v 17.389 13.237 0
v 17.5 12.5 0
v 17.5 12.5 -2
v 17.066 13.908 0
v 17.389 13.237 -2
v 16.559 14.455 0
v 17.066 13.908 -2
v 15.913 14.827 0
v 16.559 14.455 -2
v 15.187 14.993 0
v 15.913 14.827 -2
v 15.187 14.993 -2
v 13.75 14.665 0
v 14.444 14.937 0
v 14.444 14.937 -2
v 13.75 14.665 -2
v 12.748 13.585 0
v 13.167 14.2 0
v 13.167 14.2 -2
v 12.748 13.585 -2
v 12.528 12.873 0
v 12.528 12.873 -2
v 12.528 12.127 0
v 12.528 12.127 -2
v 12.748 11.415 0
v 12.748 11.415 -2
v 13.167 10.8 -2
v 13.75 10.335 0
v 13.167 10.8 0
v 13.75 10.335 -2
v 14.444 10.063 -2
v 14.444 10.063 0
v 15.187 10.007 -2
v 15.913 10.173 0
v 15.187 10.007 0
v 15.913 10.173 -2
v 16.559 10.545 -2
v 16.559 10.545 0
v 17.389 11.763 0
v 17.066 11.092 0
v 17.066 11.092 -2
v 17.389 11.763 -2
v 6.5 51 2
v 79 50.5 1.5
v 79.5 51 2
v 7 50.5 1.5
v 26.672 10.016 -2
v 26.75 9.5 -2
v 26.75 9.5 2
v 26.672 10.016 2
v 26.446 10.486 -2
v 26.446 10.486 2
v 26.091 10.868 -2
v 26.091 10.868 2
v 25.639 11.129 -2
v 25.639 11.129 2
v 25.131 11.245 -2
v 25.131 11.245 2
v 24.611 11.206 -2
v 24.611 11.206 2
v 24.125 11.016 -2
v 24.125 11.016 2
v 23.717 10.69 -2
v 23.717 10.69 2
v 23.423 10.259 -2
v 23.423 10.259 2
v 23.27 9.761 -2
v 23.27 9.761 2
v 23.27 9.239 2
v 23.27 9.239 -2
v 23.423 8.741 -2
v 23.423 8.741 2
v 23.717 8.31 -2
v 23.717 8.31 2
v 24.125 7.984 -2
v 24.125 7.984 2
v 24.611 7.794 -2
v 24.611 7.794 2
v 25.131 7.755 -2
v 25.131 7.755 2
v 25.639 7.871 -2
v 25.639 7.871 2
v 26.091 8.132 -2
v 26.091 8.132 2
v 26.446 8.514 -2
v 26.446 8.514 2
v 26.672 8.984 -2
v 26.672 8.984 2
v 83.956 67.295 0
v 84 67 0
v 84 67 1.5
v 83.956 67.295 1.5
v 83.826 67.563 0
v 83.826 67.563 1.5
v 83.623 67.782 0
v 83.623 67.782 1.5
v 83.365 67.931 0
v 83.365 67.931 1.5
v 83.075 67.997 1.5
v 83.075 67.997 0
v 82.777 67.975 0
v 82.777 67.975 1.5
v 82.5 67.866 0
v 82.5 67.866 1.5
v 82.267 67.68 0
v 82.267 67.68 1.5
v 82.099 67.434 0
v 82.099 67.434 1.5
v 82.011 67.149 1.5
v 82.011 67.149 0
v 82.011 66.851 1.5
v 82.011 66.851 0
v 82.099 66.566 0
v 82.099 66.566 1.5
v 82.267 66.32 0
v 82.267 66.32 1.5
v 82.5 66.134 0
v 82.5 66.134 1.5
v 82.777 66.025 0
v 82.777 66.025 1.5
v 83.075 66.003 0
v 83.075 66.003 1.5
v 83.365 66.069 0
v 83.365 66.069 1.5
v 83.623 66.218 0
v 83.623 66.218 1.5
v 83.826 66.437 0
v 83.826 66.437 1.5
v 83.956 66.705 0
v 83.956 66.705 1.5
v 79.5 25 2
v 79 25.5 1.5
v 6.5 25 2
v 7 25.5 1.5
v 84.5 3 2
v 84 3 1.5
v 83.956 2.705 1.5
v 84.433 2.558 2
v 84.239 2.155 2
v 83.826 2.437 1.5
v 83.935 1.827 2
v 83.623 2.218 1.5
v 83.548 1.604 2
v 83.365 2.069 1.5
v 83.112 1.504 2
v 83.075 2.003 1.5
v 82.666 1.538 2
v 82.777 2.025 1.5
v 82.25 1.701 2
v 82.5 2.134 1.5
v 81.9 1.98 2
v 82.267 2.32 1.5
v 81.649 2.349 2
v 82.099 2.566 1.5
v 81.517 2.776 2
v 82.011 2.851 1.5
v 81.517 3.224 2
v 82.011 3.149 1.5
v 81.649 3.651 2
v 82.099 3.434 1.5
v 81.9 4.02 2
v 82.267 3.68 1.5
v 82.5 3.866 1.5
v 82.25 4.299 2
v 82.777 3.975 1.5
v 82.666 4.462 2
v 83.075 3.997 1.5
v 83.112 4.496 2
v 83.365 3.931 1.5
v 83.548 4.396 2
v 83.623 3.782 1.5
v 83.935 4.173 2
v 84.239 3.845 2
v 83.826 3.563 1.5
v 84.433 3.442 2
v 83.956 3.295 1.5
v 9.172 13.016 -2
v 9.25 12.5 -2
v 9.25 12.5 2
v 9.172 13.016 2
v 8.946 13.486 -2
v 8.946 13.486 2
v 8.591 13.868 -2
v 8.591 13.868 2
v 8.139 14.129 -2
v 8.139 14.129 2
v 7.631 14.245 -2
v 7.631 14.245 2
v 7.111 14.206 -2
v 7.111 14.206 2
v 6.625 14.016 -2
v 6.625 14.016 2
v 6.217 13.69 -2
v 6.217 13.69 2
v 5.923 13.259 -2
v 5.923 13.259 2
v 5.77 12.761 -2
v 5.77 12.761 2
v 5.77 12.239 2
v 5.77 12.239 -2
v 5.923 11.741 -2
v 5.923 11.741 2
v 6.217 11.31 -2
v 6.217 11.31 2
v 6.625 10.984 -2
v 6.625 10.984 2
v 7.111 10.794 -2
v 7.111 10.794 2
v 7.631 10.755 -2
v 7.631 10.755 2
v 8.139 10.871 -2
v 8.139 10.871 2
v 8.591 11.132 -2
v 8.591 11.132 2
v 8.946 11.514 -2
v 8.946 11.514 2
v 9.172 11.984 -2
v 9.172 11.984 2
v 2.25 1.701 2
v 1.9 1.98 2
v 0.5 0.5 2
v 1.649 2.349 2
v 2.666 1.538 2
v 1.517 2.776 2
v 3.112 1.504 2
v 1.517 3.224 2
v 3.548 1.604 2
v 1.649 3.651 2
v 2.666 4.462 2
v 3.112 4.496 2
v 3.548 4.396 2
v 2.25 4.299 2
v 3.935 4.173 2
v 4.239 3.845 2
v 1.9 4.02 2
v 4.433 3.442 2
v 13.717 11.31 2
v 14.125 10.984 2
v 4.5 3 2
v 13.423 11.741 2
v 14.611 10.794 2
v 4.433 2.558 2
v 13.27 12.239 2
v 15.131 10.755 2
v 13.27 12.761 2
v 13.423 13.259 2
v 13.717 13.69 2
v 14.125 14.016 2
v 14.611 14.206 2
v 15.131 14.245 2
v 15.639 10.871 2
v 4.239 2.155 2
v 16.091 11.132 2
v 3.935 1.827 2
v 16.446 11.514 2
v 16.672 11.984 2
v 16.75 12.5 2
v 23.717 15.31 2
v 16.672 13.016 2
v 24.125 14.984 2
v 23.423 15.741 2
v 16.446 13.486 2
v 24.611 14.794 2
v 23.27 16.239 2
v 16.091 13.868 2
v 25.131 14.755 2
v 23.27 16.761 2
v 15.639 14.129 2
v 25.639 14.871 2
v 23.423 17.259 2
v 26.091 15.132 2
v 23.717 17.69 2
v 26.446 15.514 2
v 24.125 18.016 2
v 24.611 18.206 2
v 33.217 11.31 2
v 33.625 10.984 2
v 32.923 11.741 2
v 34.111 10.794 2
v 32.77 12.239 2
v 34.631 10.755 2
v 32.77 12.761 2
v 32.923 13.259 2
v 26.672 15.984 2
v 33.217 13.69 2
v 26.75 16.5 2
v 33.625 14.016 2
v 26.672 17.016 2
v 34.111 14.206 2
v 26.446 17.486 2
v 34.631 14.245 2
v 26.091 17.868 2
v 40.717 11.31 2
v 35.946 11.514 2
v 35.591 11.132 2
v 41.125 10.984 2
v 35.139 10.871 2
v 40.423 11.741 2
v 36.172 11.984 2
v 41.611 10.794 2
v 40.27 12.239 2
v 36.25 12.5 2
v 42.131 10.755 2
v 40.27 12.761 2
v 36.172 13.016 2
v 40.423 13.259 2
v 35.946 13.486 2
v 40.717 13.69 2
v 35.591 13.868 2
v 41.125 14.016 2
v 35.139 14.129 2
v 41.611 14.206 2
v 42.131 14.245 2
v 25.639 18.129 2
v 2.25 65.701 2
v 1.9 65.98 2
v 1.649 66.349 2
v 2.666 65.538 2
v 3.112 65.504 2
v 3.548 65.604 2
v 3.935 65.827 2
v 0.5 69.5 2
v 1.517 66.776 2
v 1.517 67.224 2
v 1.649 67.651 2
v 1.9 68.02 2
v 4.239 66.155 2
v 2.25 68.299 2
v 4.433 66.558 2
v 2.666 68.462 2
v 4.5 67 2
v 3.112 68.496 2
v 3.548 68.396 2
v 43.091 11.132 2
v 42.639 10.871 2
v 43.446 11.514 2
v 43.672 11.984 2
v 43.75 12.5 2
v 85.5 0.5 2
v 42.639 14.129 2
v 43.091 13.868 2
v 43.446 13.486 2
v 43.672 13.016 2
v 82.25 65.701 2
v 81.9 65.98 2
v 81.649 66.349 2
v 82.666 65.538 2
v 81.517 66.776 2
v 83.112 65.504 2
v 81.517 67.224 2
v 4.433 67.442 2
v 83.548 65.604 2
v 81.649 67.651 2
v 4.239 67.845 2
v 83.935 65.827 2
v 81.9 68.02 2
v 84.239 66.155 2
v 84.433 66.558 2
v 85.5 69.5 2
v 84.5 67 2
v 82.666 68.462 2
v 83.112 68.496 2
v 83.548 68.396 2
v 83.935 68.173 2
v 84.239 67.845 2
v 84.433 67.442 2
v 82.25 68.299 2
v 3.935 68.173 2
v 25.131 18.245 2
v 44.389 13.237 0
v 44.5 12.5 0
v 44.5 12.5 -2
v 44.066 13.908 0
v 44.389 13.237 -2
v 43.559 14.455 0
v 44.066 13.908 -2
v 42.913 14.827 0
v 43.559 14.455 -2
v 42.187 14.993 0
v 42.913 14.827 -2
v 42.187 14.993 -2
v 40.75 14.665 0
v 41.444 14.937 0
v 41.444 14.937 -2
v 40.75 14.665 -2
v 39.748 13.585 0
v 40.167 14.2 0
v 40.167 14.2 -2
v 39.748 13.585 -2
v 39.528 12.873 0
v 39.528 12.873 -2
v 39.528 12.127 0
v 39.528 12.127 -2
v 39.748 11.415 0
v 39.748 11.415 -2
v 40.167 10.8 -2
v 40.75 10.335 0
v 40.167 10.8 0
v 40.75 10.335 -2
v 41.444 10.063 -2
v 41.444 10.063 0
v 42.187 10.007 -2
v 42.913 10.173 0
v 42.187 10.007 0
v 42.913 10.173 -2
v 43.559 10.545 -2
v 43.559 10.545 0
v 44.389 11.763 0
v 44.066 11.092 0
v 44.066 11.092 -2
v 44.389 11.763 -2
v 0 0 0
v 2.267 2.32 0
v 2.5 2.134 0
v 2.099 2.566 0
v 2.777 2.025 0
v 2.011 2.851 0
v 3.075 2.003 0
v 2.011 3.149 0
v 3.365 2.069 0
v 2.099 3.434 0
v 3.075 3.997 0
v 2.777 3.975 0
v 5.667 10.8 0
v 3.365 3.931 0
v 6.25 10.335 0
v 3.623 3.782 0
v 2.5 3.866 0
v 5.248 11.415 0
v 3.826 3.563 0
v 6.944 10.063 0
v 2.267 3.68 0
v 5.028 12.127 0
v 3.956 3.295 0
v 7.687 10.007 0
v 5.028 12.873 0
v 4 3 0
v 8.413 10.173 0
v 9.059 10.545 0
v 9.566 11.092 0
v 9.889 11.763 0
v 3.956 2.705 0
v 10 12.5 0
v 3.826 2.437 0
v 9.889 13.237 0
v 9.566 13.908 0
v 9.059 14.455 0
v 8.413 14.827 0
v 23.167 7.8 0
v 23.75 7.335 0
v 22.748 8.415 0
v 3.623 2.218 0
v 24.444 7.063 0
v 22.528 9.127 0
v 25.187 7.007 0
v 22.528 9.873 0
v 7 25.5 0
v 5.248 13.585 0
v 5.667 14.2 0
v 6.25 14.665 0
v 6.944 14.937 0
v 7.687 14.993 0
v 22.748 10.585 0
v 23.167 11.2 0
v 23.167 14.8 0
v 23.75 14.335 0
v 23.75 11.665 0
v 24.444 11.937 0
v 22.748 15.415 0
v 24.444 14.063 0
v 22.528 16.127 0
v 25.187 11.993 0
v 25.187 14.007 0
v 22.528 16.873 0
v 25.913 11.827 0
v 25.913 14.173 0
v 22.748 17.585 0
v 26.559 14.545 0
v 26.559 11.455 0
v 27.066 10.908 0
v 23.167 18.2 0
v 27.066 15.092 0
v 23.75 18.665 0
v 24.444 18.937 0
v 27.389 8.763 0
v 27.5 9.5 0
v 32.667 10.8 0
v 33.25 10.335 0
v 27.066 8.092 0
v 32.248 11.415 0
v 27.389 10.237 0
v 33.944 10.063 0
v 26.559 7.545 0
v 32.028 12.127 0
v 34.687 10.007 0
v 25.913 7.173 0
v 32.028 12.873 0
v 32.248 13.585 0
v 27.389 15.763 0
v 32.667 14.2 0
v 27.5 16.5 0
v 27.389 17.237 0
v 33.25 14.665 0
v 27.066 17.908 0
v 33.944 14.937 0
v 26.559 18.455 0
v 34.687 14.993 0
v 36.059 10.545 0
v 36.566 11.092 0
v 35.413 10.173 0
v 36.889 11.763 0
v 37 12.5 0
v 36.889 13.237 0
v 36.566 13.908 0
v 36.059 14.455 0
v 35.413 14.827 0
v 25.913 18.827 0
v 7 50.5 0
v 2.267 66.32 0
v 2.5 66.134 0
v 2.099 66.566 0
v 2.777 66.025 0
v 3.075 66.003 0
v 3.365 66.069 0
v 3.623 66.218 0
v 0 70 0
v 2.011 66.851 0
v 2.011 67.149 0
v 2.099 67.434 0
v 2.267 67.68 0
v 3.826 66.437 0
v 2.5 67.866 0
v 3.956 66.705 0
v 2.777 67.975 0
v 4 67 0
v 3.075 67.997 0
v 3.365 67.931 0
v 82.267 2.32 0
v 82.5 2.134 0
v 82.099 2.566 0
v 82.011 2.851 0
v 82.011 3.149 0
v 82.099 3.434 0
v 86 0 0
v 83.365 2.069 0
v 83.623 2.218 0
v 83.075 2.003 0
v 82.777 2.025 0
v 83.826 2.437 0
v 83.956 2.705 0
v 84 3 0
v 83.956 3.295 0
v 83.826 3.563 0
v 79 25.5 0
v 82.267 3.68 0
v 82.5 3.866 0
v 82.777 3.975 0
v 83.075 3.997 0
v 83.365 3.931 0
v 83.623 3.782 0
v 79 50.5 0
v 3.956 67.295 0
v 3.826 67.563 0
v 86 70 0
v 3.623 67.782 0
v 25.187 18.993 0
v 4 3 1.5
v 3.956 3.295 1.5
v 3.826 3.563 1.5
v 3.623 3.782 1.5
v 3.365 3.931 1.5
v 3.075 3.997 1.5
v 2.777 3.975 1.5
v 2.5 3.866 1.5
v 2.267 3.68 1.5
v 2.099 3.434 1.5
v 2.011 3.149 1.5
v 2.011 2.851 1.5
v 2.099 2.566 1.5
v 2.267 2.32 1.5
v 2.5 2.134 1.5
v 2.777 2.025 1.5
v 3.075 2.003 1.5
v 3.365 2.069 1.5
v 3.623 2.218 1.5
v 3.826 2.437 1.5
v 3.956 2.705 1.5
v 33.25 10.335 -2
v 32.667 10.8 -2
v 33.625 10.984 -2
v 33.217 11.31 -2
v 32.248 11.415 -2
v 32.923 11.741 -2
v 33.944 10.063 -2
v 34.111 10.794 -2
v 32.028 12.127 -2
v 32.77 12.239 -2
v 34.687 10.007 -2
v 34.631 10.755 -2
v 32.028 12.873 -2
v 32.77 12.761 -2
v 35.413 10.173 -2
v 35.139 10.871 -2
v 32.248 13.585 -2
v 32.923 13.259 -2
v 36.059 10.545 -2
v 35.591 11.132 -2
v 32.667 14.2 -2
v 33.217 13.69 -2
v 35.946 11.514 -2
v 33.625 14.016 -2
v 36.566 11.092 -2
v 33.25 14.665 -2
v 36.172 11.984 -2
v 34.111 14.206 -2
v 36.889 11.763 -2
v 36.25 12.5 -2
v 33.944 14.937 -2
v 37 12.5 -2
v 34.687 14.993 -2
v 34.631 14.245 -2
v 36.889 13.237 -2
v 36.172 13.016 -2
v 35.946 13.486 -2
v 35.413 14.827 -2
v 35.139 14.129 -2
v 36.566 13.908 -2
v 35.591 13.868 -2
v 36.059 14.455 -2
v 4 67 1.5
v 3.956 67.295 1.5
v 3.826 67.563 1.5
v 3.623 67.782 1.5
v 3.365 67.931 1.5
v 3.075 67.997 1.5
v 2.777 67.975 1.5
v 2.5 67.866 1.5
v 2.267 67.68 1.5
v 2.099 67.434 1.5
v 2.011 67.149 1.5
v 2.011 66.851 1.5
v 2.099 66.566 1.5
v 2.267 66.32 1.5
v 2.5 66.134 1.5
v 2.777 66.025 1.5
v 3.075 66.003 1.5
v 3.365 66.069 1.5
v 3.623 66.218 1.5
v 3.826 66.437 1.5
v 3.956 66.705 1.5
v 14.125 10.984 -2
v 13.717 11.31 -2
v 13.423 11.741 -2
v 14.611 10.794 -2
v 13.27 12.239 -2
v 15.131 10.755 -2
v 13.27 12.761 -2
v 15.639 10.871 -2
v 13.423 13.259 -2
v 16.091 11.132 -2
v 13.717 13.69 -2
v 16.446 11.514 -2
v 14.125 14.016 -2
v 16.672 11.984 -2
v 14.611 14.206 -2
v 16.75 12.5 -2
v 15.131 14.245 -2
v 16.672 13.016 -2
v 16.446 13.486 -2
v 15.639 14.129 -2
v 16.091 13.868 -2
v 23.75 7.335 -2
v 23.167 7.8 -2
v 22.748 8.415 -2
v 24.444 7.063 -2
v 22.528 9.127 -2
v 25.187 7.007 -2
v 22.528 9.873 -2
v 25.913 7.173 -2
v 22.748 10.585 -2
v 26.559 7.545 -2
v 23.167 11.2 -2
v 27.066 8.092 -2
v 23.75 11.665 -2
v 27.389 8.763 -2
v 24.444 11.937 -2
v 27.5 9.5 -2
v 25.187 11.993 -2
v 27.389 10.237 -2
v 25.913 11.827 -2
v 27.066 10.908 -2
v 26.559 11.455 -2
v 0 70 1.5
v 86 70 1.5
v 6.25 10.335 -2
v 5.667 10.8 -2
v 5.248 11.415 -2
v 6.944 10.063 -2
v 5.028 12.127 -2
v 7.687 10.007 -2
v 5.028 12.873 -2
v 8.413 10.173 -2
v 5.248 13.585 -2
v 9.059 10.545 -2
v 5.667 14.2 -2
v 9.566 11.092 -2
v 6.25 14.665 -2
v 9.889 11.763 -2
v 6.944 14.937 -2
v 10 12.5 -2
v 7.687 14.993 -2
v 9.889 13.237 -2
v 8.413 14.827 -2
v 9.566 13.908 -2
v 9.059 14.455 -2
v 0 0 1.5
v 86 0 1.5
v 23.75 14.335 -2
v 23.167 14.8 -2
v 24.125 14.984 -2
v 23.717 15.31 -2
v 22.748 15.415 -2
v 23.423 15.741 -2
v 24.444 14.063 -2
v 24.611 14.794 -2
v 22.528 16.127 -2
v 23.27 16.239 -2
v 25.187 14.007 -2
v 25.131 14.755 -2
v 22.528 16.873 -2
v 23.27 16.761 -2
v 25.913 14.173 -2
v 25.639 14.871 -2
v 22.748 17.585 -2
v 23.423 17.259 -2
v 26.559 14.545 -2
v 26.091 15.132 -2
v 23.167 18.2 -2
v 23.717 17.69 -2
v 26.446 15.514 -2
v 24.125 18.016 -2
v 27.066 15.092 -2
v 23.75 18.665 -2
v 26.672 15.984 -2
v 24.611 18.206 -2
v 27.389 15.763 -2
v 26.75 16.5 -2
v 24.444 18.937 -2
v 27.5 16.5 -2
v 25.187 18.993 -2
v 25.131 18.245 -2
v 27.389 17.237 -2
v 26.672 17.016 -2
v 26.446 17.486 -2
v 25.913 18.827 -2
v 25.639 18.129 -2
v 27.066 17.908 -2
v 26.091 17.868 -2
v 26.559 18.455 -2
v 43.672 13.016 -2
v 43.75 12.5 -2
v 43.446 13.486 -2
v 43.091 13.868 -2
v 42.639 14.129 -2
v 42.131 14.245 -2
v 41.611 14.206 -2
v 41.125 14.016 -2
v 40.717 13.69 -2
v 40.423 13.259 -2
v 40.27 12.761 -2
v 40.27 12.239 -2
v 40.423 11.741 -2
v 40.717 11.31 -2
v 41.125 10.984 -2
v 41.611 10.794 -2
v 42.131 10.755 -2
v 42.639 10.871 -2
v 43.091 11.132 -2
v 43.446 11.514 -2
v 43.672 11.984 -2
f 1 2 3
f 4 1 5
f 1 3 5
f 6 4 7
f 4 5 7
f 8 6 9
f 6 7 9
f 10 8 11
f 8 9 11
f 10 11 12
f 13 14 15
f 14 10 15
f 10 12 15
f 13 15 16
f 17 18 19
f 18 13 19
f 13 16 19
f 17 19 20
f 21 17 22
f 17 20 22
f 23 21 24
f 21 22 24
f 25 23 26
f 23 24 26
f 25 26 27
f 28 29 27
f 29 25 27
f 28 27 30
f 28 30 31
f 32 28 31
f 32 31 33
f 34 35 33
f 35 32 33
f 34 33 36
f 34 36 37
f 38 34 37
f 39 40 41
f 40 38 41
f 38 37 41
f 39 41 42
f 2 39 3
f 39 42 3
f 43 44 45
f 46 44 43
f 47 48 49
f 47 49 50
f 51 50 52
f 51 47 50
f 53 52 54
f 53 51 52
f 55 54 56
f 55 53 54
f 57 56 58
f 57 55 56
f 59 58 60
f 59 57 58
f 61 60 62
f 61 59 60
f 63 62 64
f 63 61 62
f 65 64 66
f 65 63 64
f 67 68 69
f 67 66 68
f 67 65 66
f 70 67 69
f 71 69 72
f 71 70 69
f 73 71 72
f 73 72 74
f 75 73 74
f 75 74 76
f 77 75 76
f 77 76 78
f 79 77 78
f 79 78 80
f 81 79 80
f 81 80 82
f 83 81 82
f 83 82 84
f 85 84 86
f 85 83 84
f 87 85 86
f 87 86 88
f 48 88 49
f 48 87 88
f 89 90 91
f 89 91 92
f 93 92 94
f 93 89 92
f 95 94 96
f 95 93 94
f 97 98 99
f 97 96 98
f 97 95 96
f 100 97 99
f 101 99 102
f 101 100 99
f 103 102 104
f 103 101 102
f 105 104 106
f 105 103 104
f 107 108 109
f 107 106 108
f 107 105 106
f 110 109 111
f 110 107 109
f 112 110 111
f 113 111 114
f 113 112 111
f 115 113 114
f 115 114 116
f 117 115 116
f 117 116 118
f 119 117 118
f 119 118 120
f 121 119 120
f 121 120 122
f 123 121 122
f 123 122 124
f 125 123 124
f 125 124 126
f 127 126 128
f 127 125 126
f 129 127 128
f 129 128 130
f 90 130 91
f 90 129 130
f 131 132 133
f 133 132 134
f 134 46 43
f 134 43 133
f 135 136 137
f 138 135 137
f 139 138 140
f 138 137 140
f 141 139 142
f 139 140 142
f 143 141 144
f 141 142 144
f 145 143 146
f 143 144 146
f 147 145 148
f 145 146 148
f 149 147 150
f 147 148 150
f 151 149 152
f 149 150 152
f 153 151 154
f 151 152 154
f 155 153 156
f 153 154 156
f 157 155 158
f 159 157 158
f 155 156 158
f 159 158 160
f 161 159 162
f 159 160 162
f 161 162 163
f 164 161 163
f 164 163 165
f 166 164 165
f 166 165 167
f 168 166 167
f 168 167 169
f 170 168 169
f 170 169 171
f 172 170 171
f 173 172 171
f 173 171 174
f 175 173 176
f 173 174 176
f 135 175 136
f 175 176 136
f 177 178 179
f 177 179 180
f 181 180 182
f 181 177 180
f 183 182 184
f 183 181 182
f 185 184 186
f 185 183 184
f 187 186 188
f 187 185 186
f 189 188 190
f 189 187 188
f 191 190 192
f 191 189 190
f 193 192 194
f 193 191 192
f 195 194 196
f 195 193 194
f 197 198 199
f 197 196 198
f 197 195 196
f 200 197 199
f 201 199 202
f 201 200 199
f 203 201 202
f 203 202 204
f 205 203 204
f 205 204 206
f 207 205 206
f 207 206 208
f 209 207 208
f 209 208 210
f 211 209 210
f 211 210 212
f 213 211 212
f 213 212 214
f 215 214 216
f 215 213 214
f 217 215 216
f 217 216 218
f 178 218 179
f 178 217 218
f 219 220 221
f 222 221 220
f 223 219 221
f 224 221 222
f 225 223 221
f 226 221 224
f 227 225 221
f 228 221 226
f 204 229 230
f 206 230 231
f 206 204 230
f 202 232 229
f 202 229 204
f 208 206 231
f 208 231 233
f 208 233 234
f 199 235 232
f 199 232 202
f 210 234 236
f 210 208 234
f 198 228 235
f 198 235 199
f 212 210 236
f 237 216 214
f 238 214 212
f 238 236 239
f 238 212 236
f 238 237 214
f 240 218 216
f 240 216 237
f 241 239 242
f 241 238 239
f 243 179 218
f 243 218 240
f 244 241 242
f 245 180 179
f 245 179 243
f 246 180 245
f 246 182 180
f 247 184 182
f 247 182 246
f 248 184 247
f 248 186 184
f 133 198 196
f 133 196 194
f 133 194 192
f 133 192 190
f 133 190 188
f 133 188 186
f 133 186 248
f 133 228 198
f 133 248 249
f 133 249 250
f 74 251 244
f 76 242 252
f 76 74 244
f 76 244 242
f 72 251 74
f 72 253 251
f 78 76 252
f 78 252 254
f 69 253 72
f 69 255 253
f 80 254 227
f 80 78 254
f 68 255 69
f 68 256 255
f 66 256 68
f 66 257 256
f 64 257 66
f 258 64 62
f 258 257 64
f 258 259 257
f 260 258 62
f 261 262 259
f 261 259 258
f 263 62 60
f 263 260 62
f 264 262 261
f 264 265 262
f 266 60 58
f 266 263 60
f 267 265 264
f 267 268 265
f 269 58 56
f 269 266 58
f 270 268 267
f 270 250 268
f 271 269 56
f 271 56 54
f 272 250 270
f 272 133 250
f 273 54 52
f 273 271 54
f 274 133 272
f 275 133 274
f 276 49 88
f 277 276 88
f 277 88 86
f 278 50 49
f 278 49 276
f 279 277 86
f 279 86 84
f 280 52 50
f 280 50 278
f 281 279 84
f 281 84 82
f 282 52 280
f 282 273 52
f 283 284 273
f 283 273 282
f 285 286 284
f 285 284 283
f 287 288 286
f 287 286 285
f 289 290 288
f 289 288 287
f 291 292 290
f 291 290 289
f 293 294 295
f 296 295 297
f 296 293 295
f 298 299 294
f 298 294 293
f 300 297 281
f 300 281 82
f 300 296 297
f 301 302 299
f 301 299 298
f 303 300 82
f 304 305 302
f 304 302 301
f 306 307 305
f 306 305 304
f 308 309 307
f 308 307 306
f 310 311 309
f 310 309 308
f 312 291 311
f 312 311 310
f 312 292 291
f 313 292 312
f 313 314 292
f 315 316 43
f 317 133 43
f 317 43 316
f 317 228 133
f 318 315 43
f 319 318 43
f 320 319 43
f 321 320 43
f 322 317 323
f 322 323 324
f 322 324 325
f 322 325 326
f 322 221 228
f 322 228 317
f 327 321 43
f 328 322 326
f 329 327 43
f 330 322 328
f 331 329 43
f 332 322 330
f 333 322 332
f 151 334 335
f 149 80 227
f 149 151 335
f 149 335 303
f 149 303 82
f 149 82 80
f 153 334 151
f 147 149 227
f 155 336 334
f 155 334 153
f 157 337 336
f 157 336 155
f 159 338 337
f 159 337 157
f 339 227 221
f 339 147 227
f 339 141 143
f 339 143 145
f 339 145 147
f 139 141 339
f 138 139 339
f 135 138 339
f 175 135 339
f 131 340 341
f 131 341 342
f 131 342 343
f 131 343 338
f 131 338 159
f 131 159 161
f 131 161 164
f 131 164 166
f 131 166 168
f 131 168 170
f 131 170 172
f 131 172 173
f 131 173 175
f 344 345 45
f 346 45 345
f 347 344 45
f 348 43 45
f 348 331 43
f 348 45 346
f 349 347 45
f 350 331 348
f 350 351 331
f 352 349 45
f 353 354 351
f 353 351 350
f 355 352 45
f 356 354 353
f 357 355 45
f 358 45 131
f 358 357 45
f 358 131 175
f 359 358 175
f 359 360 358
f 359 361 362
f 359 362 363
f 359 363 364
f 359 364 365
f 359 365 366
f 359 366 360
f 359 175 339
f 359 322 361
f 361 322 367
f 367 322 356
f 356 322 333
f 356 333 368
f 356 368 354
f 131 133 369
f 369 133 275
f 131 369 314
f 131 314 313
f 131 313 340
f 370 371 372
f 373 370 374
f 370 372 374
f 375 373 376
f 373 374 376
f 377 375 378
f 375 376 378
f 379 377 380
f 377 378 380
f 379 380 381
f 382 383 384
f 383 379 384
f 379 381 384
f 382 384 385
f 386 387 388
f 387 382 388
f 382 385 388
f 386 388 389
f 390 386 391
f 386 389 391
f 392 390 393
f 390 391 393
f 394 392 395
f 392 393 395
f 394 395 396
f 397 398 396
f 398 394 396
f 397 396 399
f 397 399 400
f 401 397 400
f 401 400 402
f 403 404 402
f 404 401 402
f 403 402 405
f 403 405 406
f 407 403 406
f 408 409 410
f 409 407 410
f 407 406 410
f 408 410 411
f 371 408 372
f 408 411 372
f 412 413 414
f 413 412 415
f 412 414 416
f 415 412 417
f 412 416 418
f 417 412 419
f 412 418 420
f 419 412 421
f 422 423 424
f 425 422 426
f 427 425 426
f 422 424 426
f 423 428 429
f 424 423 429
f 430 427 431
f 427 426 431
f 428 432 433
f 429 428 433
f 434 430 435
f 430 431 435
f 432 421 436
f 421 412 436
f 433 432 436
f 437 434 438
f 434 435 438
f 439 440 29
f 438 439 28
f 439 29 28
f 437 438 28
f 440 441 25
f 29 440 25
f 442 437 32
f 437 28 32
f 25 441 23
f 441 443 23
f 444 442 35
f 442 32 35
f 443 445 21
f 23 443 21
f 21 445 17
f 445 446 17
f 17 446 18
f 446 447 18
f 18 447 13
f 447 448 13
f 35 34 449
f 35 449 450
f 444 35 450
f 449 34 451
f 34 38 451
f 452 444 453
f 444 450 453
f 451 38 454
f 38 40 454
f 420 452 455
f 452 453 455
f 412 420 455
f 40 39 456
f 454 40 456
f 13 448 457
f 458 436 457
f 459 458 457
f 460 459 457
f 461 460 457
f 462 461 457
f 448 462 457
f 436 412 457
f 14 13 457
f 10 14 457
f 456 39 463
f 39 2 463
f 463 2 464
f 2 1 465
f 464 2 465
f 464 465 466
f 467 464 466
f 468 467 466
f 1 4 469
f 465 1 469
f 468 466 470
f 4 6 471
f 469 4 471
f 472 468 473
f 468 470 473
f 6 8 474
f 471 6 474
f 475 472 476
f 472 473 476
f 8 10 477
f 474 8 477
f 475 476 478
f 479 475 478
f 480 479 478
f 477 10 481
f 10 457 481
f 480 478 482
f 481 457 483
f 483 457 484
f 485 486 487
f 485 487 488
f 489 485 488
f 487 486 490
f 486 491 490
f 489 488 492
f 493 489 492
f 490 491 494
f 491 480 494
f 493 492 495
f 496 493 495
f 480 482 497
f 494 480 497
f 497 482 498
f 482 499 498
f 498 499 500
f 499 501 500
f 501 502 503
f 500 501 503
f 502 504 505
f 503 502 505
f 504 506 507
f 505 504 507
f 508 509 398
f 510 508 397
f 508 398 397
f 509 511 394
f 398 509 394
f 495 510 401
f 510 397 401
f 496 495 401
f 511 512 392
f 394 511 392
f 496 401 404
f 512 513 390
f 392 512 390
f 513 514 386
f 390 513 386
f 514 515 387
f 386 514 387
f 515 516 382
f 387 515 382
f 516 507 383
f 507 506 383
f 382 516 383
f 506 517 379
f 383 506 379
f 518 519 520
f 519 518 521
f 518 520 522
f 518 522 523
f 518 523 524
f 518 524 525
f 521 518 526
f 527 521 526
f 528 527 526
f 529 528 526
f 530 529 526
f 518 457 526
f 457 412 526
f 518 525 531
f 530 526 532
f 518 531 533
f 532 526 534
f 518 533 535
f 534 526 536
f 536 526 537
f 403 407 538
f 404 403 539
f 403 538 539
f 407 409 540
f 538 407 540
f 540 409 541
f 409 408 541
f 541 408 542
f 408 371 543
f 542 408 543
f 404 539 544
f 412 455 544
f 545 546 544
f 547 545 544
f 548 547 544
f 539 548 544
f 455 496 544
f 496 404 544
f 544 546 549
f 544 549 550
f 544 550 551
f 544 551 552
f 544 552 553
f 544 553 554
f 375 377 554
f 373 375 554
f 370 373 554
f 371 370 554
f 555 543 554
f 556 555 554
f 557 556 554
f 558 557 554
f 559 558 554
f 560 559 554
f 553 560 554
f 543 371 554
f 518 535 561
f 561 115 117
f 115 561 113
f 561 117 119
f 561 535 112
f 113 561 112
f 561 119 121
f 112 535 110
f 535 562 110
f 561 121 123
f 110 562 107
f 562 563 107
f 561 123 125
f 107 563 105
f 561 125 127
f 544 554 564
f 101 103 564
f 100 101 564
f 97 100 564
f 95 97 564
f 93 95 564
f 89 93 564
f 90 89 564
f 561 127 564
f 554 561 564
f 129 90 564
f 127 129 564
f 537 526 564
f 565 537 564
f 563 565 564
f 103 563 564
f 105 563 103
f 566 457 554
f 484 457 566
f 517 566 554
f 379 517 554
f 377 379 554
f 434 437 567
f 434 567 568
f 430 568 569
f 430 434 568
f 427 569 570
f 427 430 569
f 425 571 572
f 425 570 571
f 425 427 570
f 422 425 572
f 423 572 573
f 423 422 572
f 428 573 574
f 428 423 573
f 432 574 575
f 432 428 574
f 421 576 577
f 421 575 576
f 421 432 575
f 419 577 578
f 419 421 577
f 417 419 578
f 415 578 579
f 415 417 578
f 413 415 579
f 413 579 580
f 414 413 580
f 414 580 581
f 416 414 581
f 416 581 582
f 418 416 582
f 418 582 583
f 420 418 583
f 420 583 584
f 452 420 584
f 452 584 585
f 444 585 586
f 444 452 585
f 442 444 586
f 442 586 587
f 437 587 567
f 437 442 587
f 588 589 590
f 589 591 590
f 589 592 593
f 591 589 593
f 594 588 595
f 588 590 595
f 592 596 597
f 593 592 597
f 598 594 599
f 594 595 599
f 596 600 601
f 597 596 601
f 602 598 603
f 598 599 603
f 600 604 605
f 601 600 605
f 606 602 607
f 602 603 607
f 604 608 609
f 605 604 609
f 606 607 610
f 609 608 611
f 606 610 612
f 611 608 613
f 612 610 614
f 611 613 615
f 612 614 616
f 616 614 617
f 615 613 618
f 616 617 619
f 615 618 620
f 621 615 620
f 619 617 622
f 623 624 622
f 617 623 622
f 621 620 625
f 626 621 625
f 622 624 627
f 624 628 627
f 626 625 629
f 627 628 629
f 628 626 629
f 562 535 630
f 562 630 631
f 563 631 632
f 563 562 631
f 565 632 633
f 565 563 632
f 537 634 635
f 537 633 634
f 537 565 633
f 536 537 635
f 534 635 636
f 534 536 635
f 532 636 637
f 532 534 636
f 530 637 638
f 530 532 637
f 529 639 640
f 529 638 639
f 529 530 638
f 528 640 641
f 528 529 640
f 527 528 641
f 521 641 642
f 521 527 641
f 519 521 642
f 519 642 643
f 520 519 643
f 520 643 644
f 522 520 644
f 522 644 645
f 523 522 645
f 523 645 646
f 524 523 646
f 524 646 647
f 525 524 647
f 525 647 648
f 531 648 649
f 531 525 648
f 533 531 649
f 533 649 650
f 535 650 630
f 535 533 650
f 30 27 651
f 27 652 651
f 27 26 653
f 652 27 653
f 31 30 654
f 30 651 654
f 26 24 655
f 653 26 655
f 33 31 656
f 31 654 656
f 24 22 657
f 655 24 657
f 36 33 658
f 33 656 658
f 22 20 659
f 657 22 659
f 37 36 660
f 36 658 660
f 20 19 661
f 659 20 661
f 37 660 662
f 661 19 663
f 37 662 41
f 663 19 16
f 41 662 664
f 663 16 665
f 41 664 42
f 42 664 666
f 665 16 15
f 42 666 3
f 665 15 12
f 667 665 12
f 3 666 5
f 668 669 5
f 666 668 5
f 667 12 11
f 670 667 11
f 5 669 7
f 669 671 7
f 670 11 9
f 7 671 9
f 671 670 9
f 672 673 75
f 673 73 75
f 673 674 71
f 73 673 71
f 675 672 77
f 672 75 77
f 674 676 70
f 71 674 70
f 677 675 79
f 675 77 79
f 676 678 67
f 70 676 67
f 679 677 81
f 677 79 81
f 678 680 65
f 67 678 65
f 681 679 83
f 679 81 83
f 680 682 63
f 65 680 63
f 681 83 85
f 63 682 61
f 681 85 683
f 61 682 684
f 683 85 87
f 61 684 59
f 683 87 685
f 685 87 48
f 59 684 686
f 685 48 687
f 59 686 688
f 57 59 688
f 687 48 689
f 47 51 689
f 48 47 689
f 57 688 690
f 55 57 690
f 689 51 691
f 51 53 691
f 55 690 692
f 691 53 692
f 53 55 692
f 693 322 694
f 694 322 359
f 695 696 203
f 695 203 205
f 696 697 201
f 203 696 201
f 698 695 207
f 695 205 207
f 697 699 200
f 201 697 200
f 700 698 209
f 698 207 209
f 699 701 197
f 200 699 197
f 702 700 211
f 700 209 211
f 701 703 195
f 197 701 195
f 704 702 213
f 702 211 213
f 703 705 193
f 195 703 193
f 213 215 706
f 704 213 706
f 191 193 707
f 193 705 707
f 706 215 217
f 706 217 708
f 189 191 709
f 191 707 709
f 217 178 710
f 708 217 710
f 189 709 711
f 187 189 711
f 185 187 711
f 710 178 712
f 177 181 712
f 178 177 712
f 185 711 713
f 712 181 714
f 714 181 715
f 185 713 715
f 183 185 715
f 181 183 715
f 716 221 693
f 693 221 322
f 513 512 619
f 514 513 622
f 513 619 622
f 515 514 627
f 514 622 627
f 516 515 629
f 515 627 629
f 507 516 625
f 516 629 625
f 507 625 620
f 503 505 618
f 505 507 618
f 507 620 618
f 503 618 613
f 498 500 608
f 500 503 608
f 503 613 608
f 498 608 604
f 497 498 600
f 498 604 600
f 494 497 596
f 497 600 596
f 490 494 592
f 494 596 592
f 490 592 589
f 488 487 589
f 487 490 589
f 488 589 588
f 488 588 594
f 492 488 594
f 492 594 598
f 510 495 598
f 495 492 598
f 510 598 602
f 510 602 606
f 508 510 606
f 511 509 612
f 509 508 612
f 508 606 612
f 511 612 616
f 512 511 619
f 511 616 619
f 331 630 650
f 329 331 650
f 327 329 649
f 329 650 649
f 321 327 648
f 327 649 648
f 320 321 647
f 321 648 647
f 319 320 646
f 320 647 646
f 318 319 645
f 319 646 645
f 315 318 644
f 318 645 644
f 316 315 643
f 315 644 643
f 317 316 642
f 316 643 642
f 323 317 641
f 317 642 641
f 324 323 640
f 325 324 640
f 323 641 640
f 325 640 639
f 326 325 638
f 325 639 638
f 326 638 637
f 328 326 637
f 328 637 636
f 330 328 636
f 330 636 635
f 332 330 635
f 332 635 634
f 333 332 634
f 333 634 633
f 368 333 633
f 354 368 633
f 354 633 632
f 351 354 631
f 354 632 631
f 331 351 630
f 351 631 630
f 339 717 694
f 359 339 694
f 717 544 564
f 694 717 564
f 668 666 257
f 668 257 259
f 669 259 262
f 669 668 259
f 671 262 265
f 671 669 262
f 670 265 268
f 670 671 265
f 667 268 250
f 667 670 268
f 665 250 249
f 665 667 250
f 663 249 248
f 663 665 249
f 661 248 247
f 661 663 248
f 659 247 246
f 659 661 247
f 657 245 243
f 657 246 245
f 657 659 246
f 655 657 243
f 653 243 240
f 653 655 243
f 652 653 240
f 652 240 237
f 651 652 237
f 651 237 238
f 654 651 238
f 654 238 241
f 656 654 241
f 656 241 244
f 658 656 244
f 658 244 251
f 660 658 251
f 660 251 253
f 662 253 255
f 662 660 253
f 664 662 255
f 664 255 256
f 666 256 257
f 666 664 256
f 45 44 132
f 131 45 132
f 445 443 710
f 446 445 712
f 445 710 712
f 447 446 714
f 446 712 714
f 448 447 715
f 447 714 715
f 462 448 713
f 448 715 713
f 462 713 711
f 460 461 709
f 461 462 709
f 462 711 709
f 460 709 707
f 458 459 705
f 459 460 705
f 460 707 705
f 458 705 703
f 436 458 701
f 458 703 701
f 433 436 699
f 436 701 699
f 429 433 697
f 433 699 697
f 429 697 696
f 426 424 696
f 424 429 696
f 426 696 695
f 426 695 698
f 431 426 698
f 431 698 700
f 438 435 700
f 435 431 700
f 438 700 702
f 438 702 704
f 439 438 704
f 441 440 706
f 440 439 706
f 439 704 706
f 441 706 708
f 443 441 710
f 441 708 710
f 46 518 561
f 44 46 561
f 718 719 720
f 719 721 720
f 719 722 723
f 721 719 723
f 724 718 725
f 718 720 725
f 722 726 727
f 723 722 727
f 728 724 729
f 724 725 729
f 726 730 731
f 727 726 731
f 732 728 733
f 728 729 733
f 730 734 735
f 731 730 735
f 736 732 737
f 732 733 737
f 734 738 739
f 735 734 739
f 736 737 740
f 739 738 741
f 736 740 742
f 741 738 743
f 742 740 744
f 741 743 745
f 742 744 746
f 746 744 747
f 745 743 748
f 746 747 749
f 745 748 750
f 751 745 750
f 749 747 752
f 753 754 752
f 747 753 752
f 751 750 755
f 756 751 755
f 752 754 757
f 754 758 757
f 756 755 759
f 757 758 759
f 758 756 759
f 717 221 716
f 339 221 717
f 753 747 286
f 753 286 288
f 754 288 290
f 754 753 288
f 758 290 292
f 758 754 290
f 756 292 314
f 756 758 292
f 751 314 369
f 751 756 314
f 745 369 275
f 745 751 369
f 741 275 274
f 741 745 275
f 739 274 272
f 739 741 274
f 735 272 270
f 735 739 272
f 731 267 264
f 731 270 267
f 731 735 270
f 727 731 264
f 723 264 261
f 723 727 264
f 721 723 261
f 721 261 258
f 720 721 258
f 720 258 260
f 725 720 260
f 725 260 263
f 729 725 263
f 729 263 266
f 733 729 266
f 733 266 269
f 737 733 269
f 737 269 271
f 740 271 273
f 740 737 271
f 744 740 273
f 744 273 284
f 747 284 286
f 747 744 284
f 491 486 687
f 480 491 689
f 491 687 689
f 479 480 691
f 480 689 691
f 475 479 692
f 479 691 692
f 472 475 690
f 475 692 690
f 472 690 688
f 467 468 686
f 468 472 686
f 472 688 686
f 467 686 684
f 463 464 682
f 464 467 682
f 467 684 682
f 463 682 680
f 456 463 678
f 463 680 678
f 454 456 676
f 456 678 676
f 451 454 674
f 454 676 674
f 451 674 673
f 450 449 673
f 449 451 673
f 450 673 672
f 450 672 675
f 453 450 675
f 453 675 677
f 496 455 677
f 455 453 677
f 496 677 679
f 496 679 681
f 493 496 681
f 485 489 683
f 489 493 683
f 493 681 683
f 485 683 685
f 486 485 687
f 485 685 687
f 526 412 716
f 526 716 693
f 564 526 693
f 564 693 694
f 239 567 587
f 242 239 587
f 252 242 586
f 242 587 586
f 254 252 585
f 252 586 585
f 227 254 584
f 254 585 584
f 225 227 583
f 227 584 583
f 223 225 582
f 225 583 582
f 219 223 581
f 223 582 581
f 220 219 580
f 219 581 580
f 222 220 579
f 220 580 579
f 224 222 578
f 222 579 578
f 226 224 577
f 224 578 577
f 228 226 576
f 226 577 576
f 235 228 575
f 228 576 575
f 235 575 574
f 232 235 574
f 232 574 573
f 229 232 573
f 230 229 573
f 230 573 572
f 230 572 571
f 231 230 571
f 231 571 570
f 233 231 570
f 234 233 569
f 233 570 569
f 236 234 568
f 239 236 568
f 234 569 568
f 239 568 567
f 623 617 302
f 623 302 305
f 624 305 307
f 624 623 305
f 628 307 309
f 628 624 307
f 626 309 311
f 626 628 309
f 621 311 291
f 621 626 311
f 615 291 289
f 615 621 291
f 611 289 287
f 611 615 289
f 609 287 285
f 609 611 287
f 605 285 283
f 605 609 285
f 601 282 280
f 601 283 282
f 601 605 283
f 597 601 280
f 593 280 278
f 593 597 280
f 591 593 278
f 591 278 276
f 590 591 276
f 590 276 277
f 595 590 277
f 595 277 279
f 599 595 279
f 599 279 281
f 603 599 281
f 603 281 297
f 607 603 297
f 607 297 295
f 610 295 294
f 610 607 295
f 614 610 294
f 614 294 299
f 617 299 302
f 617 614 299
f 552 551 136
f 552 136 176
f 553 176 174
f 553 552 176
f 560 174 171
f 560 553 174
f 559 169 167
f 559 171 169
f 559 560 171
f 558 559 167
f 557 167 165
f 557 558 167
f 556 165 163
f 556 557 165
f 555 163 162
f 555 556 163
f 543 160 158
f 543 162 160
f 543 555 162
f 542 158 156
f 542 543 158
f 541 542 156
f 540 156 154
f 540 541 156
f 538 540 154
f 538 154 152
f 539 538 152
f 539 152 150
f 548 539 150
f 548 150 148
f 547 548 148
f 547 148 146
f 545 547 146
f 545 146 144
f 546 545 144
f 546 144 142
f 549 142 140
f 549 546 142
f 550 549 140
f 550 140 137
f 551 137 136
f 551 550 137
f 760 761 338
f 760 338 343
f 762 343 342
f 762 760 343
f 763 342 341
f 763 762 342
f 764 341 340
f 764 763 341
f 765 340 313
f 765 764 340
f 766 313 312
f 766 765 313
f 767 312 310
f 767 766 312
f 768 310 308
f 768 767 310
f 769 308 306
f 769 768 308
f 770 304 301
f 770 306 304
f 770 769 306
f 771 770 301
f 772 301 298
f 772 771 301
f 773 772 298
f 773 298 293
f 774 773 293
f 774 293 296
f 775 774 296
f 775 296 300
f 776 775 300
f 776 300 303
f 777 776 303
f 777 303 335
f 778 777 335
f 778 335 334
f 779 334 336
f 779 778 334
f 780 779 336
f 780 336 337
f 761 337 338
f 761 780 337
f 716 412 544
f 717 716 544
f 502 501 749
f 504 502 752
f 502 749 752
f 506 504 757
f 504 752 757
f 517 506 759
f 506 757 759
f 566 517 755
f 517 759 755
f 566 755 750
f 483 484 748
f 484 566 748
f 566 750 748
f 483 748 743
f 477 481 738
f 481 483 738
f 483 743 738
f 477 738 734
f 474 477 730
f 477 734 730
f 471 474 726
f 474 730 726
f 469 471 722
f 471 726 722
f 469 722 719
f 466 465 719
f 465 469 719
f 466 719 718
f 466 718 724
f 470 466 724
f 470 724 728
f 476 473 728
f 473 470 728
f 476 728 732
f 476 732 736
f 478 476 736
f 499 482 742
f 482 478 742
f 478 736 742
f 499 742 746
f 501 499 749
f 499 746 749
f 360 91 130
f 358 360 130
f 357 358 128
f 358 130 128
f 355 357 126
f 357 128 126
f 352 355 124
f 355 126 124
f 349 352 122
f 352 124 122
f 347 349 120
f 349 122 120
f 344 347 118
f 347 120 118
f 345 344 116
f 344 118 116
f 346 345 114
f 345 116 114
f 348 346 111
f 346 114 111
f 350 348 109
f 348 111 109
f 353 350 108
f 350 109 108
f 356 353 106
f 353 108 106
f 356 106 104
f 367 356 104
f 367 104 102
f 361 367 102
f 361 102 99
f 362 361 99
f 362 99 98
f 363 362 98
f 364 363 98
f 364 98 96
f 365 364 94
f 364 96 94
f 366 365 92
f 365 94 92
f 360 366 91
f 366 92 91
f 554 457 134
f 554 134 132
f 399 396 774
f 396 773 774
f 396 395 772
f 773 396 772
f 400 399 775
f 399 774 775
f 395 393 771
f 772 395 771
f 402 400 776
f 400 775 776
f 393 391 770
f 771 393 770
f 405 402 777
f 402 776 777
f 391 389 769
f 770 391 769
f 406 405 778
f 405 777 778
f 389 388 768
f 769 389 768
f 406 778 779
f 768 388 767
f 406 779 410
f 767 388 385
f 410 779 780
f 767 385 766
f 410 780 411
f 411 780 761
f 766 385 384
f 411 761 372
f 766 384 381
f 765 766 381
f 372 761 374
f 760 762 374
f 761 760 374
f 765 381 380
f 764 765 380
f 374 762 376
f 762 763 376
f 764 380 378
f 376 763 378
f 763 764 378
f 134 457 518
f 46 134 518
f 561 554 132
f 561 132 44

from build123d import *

# Parameters (mm, degrees)
CYLINDER009_R     = 1.75
CYLINDER009_DEPTH = 10
CYLINDER010_R     = 2.5
CYLINDER010_DEPTH = 4
CYLINDER008_R     = 1.75
CYLINDER008_DEPTH = 10
CYLINDER011_R     = 2.5
CYLINDER011_DEPTH = 4
CYLINDER007_R     = 1.75
CYLINDER007_DEPTH = 10
CYLINDER013_R     = 2.5
CYLINDER013_DEPTH = 4
CYLINDER006_R     = 1.75
CYLINDER006_DEPTH = 10
CYLINDER012_R     = 2.5
CYLINDER012_DEPTH = 4
CYLINDER005_R     = 1.75
CYLINDER005_DEPTH = 10
CYLINDER014_R     = 2.5
CYLINDER014_DEPTH = 4
CYLINDER004_R     = 1.75
CYLINDER004_DEPTH = 10
CYLINDER015_R     = 2.5
CYLINDER015_DEPTH = 4
CYLINDER003_R     = 1
CYLINDER003_DEPTH = 10
CYLINDER002_R     = 1
CYLINDER002_DEPTH = 10
CYLINDER001_R     = 1
CYLINDER001_DEPTH = 10
CYLINDER_R        = 1
CYLINDER_DEPTH    = 10
BOX001_W          = 72
BOX001_H          = 25
BOX001_DEPTH      = 10
BOX_W             = 86
BOX_H             = 70
BOX_DEPTH         = 2
CHAMFER_SIZE      = 0.5
CHAMFER001_SIZE   = 0.5


with BuildPart() as cilindro009:
    # Cylinder009 → Cylinder009 (new body)
    with BuildSketch(Plane(origin=(42, 12.5, -3), x_dir=(1, 0, 0), z_dir=(0, 0, 1))):
        Circle(CYLINDER009_R)
    extrude(amount=CYLINDER009_DEPTH)


with BuildPart() as cut011:
    # Cylinder010 → Cylinder010 (new body)
    with BuildSketch(Plane(origin=(42, 12.5, -2), x_dir=(1, 0, 0), z_dir=(0, 0, 1))):
        Circle(CYLINDER010_R)
    extrude(amount=CYLINDER010_DEPTH)

    # Cut011: cut Cilindro009
    add(cilindro009.part, mode=Mode.SUBTRACT)


with BuildPart() as cilindro008:
    # Cylinder008 → Cylinder008 (new body)
    with BuildSketch(Plane(origin=(34.5, 12.5, -3), x_dir=(1, 0, 0), z_dir=(0, 0, 1))):
        Circle(CYLINDER008_R)
    extrude(amount=CYLINDER008_DEPTH)


with BuildPart() as cut012:
    # Cylinder011 → Cylinder011 (new body)
    with BuildSketch(Plane(origin=(34.5, 12.5, -2), x_dir=(1, 0, 0), z_dir=(0, 0, 1))):
        Circle(CYLINDER011_R)
    extrude(amount=CYLINDER011_DEPTH)

    # Cut012: cut Cilindro008
    add(cilindro008.part, mode=Mode.SUBTRACT)


with BuildPart() as cilindro007:
    # Cylinder007 → Cylinder007 (new body)
    with BuildSketch(Plane(origin=(25, 9.5, -3), x_dir=(1, 0, 0), z_dir=(0, 0, 1))):
        Circle(CYLINDER007_R)
    extrude(amount=CYLINDER007_DEPTH)


with BuildPart() as cut013:
    # Cylinder013 → Cylinder013 (new body)
    with BuildSketch(Plane(origin=(25, 9.5, -2), x_dir=(1, 0, 0), z_dir=(0, 0, 1))):
        Circle(CYLINDER013_R)
    extrude(amount=CYLINDER013_DEPTH)

    # Cut013: cut Cilindro007
    add(cilindro007.part, mode=Mode.SUBTRACT)


with BuildPart() as cilindro006:
    # Cylinder006 → Cylinder006 (new body)
    with BuildSketch(Plane(origin=(25, 16.5, -3), x_dir=(1, 0, 0), z_dir=(0, 0, 1))):
        Circle(CYLINDER006_R)
    extrude(amount=CYLINDER006_DEPTH)


with BuildPart() as cut014:
    # Cylinder012 → Cylinder012 (new body)
    with BuildSketch(Plane(origin=(25, 16.5, -2), x_dir=(1, 0, 0), z_dir=(0, 0, 1))):
        Circle(CYLINDER012_R)
    extrude(amount=CYLINDER012_DEPTH)

    # Cut014: cut Cilindro006
    add(cilindro006.part, mode=Mode.SUBTRACT)


with BuildPart() as cilindro005:
    # Cylinder005 → Cylinder005 (new body)
    with BuildSketch(Plane(origin=(15, 12.5, -3), x_dir=(1, 0, 0), z_dir=(0, 0, 1))):
        Circle(CYLINDER005_R)
    extrude(amount=CYLINDER005_DEPTH)


with BuildPart() as cut015:
    # Cylinder014 → Cylinder014 (new body)
    with BuildSketch(Plane(origin=(15, 12.5, -2), x_dir=(1, 0, 0), z_dir=(0, 0, 1))):
        Circle(CYLINDER014_R)
    extrude(amount=CYLINDER014_DEPTH)

    # Cut015: cut Cilindro005
    add(cilindro005.part, mode=Mode.SUBTRACT)


with BuildPart() as cilindro004:
    # Cylinder004 → Cylinder004 (new body)
    with BuildSketch(Plane(origin=(7.5, 12.5, -3), x_dir=(1, 0, 0), z_dir=(0, 0, 1))):
        Circle(CYLINDER004_R)
    extrude(amount=CYLINDER004_DEPTH)


with BuildPart() as cut016:
    # Cylinder015 → Cylinder015 (new body)
    with BuildSketch(Plane(origin=(7.5, 12.5, -2), x_dir=(1, 0, 0), z_dir=(0, 0, 1))):
        Circle(CYLINDER015_R)
    extrude(amount=CYLINDER015_DEPTH)

    # Cut016: cut Cilindro004
    add(cilindro004.part, mode=Mode.SUBTRACT)


with BuildPart() as cilindro003:
    # Cylinder003 → Cylinder003 (new body)
    with BuildSketch(Plane(origin=(83, 67, -1), x_dir=(1, 0, 0), z_dir=(0, 0, 1))):
        Circle(CYLINDER003_R)
    extrude(amount=CYLINDER003_DEPTH)


with BuildPart() as cilindro002:
    # Cylinder002 → Cylinder002 (new body)
    with BuildSketch(Plane(origin=(83, 3, -1), x_dir=(1, 0, 0), z_dir=(0, 0, 1))):
        Circle(CYLINDER002_R)
    extrude(amount=CYLINDER002_DEPTH)


with BuildPart() as cilindro001:
    # Cylinder001 → Cylinder001 (new body)
    with BuildSketch(Plane(origin=(3, 67, -1), x_dir=(1, 0, 0), z_dir=(0, 0, 1))):
        Circle(CYLINDER001_R)
    extrude(amount=CYLINDER001_DEPTH)


with BuildPart() as cilindro:
    # Cylinder → Cylinder (new body)
    with BuildSketch(Plane(origin=(3, 3, -1), x_dir=(1, 0, 0), z_dir=(0, 0, 1))):
        Circle(CYLINDER_R)
    extrude(amount=CYLINDER_DEPTH)


with BuildPart() as cubo001:
    # Box001 → Box001 (new body)
    with BuildSketch(Plane(origin=(7, 25.5, 0), x_dir=(1, 0, 0), z_dir=(0, 0, 1))):
        with Locations((36, 12.5)):
            Rectangle(BOX001_W, BOX001_H)
    extrude(amount=BOX001_DEPTH)


with BuildPart() as fusion001:
    # Box → Box (new body)
    with BuildSketch(Plane.XY):
        with Locations((43, 35)):
            Rectangle(BOX_W, BOX_H)
    extrude(amount=BOX_DEPTH)

    # Cut: cut Cubo001
    add(cubo001.part, mode=Mode.SUBTRACT)

    # Cut001: cut Cilindro
    add(cilindro.part, mode=Mode.SUBTRACT)

    # Cut002: cut Cilindro001
    add(cilindro001.part, mode=Mode.SUBTRACT)

    # Cut003: cut Cilindro002
    add(cilindro002.part, mode=Mode.SUBTRACT)

    # Cut004: cut Cilindro003
    add(cilindro003.part, mode=Mode.SUBTRACT)

    # Cut005: cut Cilindro004
    add(cilindro004.part, mode=Mode.SUBTRACT)

    # Cut006: cut Cilindro005
    add(cilindro005.part, mode=Mode.SUBTRACT)

    # Cut007: cut Cilindro006
    add(cilindro006.part, mode=Mode.SUBTRACT)

    # Cut008: cut Cilindro007
    add(cilindro007.part, mode=Mode.SUBTRACT)

    # Cut009: cut Cilindro008
    add(cilindro008.part, mode=Mode.SUBTRACT)

    # Cut010: cut Cilindro009
    add(cilindro009.part, mode=Mode.SUBTRACT)

    # Chamfer
    chamfer_edges = [fusion001.edges().sort_by_distance(p)[0] for p in [
        (0, 35, 2),
        (43, 0, 2),
        (43, 70, 2),
        (86, 35, 2),
        (43, 25.5, 2),
        (79, 38, 2),
        (7, 38, 2),
        (43, 50.5, 2),
    ]]
    chamfer(chamfer_edges, length=CHAMFER_SIZE)

    # Chamfer001
    chamfer001_edges = [fusion001.edges().sort_by_distance(p)[0] for p in [
        (2, 3, 2),
        (82, 3, 2),
        (2, 67, 2),
        (82, 67, 2),
    ]]
    chamfer(chamfer001_edges, length=CHAMFER001_SIZE)

    # Fusion: union Cut011, Cut012, Cut013, Cut014, Cut015, Cut016
    add(cut011.part)
    add(cut012.part)
    add(cut013.part)
    add(cut014.part)
    add(cut015.part)
    add(cut016.part)


solid = fusion001.part
